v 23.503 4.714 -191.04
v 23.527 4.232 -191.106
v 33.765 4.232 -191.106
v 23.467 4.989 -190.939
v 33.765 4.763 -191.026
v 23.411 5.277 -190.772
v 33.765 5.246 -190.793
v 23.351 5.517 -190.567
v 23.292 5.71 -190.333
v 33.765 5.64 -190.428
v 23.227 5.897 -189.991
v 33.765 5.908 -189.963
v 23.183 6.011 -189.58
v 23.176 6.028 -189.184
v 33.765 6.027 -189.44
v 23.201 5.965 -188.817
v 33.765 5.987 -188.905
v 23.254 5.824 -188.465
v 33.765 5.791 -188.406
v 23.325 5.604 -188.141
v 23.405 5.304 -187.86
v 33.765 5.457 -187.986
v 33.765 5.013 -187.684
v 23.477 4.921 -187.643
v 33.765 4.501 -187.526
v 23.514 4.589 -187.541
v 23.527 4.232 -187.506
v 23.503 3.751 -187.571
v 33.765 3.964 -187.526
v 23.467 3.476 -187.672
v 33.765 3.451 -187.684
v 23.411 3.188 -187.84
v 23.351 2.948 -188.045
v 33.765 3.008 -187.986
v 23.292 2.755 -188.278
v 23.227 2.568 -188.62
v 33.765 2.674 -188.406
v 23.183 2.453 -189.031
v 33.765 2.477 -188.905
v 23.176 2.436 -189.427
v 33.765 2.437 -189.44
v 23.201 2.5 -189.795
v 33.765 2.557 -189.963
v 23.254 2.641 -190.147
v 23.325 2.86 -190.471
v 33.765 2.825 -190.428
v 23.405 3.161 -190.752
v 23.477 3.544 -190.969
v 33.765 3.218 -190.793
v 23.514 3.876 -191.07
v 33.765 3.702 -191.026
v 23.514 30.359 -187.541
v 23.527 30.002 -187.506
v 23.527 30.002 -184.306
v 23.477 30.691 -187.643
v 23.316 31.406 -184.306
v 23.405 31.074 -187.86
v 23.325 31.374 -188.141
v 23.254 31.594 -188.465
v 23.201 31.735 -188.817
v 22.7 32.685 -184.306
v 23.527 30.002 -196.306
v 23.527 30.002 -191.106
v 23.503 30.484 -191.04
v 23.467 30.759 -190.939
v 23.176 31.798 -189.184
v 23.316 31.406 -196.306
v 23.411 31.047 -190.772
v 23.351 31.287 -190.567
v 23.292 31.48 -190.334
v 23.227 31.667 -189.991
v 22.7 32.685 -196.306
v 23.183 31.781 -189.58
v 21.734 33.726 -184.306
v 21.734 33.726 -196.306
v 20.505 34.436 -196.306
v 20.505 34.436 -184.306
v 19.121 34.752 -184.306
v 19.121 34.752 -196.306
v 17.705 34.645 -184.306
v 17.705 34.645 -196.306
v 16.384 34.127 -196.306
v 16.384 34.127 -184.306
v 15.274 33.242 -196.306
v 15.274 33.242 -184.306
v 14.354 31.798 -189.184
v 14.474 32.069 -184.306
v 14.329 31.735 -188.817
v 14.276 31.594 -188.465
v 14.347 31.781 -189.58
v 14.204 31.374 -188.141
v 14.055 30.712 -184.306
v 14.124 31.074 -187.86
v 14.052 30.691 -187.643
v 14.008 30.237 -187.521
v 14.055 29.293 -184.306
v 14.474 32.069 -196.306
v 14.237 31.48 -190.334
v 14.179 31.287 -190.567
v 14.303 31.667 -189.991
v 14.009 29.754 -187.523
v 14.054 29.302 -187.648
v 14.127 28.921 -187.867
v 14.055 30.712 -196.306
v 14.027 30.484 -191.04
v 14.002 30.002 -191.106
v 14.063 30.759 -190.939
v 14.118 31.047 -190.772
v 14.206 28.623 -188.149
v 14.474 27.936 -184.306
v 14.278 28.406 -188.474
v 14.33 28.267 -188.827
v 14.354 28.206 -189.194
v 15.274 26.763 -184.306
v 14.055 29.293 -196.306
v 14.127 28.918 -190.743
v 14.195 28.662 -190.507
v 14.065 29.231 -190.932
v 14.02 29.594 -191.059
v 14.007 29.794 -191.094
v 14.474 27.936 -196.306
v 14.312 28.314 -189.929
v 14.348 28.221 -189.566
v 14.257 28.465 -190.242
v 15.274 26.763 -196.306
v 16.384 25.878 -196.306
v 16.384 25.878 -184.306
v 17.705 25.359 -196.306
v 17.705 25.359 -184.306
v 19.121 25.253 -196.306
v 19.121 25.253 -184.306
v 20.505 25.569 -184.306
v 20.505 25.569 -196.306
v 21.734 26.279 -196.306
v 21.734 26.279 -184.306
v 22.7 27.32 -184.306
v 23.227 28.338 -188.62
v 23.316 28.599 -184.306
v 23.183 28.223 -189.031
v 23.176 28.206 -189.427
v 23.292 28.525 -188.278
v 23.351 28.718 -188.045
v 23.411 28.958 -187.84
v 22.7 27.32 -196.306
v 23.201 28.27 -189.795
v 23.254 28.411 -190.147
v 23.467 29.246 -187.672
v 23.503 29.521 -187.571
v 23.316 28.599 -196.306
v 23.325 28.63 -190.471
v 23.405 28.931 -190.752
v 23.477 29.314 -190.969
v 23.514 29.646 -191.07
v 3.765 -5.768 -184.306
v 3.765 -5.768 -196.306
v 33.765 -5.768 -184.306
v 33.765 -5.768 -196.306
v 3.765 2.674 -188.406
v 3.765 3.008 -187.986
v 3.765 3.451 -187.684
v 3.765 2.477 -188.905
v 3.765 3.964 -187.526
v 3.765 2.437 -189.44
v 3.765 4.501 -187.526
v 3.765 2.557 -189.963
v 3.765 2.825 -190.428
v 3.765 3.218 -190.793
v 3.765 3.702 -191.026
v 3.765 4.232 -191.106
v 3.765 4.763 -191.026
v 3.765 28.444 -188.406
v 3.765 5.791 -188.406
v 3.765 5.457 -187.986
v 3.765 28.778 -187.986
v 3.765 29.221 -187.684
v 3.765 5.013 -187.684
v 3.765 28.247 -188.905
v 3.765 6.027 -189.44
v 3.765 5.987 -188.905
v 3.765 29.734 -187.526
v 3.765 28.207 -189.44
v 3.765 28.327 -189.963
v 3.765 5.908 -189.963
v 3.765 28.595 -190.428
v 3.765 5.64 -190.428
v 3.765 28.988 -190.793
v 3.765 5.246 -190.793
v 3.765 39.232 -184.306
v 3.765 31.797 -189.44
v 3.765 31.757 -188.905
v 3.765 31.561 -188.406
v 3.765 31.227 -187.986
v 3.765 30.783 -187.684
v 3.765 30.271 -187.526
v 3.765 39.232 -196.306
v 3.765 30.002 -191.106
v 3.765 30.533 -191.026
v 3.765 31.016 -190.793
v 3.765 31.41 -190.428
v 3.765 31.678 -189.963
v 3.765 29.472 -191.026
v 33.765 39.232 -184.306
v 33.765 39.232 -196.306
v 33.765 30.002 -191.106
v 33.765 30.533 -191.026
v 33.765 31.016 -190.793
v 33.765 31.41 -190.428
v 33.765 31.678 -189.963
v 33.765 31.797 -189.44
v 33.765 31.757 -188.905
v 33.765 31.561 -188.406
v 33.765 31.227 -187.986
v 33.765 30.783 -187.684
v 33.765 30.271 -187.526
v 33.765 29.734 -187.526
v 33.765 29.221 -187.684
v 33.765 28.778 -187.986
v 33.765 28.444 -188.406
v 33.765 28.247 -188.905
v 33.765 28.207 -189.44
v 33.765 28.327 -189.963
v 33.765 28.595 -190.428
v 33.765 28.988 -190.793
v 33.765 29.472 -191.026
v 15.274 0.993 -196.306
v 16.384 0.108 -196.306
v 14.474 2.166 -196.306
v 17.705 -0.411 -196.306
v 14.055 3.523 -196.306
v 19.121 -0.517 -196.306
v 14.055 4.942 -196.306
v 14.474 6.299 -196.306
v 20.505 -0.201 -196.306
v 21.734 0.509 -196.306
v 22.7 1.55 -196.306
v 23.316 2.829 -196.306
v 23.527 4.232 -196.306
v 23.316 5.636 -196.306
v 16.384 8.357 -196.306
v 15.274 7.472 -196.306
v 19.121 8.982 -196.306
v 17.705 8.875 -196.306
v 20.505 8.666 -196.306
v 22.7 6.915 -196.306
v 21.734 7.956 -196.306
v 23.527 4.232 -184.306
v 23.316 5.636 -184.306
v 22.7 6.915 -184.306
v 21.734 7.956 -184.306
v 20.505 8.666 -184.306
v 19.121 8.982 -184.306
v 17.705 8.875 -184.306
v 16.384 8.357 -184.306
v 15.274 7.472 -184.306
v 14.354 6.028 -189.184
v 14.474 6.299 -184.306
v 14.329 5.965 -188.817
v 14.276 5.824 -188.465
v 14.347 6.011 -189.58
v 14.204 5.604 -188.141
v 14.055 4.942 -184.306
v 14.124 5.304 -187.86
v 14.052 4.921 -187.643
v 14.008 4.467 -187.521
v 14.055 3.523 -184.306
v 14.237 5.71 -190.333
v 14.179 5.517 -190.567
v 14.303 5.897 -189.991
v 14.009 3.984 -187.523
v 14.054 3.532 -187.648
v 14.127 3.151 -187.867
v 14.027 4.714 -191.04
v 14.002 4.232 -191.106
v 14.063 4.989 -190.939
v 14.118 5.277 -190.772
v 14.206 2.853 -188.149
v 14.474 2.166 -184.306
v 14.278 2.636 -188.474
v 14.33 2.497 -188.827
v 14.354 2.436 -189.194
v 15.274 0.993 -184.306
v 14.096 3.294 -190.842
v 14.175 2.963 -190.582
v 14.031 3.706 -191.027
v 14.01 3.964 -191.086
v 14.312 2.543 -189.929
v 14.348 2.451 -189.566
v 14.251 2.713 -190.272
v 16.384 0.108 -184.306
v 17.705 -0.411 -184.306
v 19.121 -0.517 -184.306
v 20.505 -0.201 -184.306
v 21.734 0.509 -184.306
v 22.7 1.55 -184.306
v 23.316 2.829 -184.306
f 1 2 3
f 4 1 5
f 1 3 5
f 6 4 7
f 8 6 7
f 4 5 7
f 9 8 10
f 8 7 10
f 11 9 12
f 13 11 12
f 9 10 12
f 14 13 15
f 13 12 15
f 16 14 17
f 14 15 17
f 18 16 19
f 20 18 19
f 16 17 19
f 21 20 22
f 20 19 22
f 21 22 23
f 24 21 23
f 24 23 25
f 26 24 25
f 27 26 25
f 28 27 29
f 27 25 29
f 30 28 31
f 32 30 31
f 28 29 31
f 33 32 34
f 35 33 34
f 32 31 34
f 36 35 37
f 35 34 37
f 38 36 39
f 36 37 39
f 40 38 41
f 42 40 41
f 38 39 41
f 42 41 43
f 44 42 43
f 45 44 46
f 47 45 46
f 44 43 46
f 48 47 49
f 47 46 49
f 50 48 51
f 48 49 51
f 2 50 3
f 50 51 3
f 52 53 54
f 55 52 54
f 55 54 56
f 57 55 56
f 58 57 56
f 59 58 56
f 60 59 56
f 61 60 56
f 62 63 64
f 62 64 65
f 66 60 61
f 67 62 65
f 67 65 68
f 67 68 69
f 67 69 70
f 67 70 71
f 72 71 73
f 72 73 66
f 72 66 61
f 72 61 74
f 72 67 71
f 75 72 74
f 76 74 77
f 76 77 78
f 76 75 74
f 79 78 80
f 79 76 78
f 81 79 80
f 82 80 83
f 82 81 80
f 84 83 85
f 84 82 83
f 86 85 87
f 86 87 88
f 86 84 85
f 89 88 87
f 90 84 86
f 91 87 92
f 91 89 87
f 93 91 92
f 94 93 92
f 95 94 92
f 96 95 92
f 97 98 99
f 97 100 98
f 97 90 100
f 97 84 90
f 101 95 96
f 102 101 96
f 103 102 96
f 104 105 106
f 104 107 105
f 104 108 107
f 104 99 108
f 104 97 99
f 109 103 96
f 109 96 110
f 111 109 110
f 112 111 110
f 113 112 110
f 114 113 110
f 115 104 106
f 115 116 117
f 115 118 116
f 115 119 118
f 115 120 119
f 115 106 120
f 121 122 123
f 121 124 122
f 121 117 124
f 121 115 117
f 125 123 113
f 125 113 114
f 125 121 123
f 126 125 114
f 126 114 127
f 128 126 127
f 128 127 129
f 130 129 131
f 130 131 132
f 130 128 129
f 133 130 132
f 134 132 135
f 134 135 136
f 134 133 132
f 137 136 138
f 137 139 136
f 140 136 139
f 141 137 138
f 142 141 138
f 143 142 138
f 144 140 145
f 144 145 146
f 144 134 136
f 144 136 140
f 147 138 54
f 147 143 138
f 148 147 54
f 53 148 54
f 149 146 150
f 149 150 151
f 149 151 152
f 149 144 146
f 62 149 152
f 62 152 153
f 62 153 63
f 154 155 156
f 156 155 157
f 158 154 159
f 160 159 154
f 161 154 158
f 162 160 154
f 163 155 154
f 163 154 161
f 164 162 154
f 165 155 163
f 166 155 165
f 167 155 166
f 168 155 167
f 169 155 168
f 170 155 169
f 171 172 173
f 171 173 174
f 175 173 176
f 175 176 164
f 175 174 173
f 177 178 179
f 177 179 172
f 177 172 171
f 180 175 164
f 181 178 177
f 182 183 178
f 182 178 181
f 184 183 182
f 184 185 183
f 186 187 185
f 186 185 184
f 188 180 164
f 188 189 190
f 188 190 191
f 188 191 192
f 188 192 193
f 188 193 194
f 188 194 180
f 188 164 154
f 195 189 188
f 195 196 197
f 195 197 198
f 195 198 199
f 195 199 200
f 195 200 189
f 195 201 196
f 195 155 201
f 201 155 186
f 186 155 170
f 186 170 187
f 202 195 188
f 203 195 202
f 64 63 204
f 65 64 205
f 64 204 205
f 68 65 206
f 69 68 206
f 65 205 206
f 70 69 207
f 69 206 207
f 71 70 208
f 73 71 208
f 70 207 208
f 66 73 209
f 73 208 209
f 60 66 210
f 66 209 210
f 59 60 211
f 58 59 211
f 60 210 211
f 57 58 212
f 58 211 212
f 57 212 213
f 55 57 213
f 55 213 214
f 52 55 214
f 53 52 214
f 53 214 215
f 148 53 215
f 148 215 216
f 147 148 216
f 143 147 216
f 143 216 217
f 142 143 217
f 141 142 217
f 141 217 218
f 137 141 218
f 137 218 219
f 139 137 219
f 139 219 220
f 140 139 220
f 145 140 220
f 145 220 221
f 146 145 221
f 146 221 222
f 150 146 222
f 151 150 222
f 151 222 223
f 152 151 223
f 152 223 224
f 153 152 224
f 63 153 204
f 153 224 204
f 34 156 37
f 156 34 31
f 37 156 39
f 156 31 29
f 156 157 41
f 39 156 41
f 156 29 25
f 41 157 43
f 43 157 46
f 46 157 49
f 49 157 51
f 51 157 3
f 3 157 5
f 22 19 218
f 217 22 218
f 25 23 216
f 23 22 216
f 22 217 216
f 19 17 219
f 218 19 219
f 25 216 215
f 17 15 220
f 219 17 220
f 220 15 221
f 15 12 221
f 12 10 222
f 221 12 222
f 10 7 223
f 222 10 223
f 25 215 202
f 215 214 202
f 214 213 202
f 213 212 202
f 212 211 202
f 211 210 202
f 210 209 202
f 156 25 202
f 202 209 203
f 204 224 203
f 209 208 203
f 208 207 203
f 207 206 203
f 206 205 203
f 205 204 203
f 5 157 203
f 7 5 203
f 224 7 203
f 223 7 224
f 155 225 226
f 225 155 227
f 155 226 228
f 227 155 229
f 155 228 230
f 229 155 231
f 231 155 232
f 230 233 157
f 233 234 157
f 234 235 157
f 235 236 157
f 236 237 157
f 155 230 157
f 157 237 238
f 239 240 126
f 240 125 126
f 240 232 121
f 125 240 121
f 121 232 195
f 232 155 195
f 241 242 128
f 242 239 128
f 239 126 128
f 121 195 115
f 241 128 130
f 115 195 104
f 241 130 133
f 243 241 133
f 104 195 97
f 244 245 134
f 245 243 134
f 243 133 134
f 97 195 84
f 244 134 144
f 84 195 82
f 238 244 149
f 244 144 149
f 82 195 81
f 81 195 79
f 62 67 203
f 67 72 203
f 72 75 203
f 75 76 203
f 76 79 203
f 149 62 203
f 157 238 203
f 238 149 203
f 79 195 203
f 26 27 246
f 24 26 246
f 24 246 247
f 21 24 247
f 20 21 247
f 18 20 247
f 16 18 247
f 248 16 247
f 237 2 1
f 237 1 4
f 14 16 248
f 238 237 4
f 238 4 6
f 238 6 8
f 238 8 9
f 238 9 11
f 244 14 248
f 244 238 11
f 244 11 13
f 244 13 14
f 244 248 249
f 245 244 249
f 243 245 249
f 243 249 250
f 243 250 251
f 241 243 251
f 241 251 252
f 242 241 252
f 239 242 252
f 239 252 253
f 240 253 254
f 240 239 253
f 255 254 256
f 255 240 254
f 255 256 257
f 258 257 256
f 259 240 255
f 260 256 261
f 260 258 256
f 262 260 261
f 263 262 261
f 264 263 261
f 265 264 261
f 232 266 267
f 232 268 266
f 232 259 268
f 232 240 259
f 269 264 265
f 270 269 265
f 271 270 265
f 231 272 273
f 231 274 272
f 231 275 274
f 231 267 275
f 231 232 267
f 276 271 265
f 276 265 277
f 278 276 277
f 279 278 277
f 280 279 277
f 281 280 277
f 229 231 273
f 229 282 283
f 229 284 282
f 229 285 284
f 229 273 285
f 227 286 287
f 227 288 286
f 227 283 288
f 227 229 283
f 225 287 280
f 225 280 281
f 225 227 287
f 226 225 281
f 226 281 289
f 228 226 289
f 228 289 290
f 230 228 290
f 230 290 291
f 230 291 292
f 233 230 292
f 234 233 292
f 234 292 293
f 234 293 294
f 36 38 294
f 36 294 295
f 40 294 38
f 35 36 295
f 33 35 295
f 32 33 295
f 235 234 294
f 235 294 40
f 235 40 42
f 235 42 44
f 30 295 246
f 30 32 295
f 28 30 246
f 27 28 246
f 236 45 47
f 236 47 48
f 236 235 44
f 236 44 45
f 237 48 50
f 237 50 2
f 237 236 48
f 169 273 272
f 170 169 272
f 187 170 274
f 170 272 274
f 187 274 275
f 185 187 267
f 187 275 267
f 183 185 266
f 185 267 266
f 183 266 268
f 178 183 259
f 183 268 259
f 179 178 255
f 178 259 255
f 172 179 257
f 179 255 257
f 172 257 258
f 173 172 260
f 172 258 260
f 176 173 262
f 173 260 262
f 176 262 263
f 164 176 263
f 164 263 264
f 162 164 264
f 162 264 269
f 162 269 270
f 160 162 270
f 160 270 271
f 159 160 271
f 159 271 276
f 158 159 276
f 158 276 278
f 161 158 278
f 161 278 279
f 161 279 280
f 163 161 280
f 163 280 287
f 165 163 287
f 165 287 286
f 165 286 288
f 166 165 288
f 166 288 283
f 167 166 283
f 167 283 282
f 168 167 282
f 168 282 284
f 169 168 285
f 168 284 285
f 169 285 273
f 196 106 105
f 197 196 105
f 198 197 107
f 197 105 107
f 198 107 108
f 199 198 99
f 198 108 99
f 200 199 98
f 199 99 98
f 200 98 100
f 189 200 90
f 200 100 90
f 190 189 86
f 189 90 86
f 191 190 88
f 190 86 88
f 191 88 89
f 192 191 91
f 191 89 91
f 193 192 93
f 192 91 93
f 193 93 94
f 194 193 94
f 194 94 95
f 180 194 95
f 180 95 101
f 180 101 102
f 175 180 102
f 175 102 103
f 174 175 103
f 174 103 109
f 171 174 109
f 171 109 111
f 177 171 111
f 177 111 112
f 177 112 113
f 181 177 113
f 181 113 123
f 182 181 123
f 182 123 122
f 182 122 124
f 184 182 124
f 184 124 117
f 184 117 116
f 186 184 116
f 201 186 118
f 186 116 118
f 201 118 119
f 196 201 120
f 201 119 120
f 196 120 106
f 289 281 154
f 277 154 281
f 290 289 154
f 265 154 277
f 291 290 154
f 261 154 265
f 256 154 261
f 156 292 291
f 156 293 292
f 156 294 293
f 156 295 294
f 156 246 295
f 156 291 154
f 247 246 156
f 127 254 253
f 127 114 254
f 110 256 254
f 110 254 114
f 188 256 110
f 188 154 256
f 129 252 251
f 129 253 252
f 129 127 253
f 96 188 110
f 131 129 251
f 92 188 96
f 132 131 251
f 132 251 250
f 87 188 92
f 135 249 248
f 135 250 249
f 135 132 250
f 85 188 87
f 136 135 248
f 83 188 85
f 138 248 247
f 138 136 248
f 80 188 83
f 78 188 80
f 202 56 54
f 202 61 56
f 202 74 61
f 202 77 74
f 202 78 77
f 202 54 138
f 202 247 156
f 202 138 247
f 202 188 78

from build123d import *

# Parameters (mm, degrees)
ESBO_O1_W                   = 30
ESBO_O1_H                   = 45
ESBO_O1_R                   = 4.7625
RESSALTO_EXTRUS_O1_DEPTH    = 12
FURO_COM_FOLGA_DE_M31_D     = 3.6
FURO_COM_FOLGA_DE_M31_DEPTH = 30
FURO_COM_FOLGA_DE_M31_TIP   = 1.081549114


with BuildPart() as part:
    # Esboço1 → Ressalto-extrusão1 (new body)
    with BuildSketch(Plane.XY.offset(-196.305879913)):
        with Locations((18.764782864, 16.732361179)):
            Rectangle(ESBO_O1_W, ESBO_O1_H)
        with Locations((18.764782864, 30.002354844)):
            Circle(ESBO_O1_R, mode=Mode.SUBTRACT)
        with Locations((18.764782864, 4.232361179)):
            Circle(ESBO_O1_R, mode=Mode.SUBTRACT)
    extrude(amount=RESSALTO_EXTRUS_O1_DEPTH)

    # Furo com folga de M31
    with Locations(Plane.ZY.offset(-3.764782864)):
        with Locations((-189.305879913, 30.002361179), (-189.305879913, 4.232361179)):
            Hole(FURO_COM_FOLGA_DE_M31_D / 2, depth=FURO_COM_FOLGA_DE_M31_DEPTH)
            with Locations((0, 0, -(FURO_COM_FOLGA_DE_M31_DEPTH + FURO_COM_FOLGA_DE_M31_TIP / 2))):  # 118° drill point
                Cone(0, FURO_COM_FOLGA_DE_M31_D / 2, FURO_COM_FOLGA_DE_M31_TIP, mode=Mode.SUBTRACT)


solid = part.part
